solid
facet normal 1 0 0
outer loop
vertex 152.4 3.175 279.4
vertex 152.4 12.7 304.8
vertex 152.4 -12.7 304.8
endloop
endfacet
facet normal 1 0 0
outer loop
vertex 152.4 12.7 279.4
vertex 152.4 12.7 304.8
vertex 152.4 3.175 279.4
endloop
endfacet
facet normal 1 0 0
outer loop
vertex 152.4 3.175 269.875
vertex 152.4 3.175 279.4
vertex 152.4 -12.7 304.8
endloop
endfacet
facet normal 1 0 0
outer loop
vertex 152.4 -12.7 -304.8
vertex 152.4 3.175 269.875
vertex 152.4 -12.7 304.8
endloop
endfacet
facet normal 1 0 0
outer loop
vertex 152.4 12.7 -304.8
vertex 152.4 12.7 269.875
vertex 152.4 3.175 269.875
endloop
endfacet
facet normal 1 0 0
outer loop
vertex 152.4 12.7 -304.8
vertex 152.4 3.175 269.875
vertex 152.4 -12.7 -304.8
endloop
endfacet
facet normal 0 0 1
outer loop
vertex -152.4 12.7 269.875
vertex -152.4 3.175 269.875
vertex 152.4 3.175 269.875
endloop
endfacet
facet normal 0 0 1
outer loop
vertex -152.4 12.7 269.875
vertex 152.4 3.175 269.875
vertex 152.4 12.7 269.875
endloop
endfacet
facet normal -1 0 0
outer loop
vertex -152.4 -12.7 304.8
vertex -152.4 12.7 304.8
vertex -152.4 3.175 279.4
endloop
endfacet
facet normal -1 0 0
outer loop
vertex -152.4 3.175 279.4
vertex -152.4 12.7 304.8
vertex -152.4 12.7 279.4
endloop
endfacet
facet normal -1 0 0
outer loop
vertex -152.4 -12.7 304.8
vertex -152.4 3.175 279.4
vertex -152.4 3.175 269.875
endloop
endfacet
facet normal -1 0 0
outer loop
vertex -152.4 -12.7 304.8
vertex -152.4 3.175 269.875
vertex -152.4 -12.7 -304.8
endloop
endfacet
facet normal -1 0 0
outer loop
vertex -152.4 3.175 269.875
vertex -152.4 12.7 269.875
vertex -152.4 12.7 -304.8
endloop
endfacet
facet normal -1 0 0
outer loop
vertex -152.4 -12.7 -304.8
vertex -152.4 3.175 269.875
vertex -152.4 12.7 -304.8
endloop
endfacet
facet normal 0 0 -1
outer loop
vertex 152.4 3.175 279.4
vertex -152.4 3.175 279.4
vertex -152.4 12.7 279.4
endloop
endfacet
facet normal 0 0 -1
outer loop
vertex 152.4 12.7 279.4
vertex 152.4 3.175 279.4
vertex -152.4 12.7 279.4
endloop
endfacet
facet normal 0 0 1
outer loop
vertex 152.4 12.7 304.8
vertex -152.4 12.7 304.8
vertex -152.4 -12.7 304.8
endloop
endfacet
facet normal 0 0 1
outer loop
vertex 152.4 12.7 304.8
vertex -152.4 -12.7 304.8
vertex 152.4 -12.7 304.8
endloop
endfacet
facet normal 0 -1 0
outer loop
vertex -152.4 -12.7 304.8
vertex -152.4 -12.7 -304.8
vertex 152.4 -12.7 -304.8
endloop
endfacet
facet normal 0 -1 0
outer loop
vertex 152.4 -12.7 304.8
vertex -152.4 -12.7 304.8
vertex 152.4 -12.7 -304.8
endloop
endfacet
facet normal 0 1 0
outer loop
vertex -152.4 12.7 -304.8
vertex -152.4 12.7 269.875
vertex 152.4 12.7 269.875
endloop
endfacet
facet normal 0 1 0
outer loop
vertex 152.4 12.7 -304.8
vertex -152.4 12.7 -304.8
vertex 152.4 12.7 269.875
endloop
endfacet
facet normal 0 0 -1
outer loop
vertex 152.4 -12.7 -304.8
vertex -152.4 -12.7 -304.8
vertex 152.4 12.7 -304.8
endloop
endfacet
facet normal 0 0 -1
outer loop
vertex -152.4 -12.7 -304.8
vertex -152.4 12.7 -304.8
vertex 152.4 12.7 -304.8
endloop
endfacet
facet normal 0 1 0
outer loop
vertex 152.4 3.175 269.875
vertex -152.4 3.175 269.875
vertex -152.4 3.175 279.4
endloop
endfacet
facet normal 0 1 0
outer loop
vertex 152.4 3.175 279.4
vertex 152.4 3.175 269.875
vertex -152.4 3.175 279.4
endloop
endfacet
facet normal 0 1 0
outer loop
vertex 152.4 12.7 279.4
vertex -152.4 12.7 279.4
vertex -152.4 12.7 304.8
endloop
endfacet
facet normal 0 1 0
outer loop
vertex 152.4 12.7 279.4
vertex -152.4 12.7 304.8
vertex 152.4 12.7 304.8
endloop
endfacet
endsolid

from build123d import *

# Parameters (mm, degrees)
SKETCH2_W           = 304.8
SKETCH2_H           = 609.6
BOSS_EXTRUDE1_DEPTH = 12.7
SKETCH4_W           = 9.525
SKETCH4_H           = 9.525
CUT_EXTRUDE1_DEPTH  = 432.239341897


with BuildPart() as part:
    # Sketch2 → Boss-Extrude1 (new, symmetric)
    with BuildSketch(Plane(origin=(0, 0, 0), x_dir=(1, 0, 0), z_dir=(0, 1, 0))):
        Rectangle(SKETCH2_W, SKETCH2_H)
    extrude(amount=BOSS_EXTRUDE1_DEPTH, both=True)

    # Sketch4 → Cut-Extrude1 (cut, through all)
    with BuildSketch(Plane.ZY.offset(152.4)):
        with Locations((274.6375, 7.9375)):
            Rectangle(SKETCH4_W, SKETCH4_H)
    extrude(amount=-CUT_EXTRUDE1_DEPTH, mode=Mode.SUBTRACT)


solid = part.part
